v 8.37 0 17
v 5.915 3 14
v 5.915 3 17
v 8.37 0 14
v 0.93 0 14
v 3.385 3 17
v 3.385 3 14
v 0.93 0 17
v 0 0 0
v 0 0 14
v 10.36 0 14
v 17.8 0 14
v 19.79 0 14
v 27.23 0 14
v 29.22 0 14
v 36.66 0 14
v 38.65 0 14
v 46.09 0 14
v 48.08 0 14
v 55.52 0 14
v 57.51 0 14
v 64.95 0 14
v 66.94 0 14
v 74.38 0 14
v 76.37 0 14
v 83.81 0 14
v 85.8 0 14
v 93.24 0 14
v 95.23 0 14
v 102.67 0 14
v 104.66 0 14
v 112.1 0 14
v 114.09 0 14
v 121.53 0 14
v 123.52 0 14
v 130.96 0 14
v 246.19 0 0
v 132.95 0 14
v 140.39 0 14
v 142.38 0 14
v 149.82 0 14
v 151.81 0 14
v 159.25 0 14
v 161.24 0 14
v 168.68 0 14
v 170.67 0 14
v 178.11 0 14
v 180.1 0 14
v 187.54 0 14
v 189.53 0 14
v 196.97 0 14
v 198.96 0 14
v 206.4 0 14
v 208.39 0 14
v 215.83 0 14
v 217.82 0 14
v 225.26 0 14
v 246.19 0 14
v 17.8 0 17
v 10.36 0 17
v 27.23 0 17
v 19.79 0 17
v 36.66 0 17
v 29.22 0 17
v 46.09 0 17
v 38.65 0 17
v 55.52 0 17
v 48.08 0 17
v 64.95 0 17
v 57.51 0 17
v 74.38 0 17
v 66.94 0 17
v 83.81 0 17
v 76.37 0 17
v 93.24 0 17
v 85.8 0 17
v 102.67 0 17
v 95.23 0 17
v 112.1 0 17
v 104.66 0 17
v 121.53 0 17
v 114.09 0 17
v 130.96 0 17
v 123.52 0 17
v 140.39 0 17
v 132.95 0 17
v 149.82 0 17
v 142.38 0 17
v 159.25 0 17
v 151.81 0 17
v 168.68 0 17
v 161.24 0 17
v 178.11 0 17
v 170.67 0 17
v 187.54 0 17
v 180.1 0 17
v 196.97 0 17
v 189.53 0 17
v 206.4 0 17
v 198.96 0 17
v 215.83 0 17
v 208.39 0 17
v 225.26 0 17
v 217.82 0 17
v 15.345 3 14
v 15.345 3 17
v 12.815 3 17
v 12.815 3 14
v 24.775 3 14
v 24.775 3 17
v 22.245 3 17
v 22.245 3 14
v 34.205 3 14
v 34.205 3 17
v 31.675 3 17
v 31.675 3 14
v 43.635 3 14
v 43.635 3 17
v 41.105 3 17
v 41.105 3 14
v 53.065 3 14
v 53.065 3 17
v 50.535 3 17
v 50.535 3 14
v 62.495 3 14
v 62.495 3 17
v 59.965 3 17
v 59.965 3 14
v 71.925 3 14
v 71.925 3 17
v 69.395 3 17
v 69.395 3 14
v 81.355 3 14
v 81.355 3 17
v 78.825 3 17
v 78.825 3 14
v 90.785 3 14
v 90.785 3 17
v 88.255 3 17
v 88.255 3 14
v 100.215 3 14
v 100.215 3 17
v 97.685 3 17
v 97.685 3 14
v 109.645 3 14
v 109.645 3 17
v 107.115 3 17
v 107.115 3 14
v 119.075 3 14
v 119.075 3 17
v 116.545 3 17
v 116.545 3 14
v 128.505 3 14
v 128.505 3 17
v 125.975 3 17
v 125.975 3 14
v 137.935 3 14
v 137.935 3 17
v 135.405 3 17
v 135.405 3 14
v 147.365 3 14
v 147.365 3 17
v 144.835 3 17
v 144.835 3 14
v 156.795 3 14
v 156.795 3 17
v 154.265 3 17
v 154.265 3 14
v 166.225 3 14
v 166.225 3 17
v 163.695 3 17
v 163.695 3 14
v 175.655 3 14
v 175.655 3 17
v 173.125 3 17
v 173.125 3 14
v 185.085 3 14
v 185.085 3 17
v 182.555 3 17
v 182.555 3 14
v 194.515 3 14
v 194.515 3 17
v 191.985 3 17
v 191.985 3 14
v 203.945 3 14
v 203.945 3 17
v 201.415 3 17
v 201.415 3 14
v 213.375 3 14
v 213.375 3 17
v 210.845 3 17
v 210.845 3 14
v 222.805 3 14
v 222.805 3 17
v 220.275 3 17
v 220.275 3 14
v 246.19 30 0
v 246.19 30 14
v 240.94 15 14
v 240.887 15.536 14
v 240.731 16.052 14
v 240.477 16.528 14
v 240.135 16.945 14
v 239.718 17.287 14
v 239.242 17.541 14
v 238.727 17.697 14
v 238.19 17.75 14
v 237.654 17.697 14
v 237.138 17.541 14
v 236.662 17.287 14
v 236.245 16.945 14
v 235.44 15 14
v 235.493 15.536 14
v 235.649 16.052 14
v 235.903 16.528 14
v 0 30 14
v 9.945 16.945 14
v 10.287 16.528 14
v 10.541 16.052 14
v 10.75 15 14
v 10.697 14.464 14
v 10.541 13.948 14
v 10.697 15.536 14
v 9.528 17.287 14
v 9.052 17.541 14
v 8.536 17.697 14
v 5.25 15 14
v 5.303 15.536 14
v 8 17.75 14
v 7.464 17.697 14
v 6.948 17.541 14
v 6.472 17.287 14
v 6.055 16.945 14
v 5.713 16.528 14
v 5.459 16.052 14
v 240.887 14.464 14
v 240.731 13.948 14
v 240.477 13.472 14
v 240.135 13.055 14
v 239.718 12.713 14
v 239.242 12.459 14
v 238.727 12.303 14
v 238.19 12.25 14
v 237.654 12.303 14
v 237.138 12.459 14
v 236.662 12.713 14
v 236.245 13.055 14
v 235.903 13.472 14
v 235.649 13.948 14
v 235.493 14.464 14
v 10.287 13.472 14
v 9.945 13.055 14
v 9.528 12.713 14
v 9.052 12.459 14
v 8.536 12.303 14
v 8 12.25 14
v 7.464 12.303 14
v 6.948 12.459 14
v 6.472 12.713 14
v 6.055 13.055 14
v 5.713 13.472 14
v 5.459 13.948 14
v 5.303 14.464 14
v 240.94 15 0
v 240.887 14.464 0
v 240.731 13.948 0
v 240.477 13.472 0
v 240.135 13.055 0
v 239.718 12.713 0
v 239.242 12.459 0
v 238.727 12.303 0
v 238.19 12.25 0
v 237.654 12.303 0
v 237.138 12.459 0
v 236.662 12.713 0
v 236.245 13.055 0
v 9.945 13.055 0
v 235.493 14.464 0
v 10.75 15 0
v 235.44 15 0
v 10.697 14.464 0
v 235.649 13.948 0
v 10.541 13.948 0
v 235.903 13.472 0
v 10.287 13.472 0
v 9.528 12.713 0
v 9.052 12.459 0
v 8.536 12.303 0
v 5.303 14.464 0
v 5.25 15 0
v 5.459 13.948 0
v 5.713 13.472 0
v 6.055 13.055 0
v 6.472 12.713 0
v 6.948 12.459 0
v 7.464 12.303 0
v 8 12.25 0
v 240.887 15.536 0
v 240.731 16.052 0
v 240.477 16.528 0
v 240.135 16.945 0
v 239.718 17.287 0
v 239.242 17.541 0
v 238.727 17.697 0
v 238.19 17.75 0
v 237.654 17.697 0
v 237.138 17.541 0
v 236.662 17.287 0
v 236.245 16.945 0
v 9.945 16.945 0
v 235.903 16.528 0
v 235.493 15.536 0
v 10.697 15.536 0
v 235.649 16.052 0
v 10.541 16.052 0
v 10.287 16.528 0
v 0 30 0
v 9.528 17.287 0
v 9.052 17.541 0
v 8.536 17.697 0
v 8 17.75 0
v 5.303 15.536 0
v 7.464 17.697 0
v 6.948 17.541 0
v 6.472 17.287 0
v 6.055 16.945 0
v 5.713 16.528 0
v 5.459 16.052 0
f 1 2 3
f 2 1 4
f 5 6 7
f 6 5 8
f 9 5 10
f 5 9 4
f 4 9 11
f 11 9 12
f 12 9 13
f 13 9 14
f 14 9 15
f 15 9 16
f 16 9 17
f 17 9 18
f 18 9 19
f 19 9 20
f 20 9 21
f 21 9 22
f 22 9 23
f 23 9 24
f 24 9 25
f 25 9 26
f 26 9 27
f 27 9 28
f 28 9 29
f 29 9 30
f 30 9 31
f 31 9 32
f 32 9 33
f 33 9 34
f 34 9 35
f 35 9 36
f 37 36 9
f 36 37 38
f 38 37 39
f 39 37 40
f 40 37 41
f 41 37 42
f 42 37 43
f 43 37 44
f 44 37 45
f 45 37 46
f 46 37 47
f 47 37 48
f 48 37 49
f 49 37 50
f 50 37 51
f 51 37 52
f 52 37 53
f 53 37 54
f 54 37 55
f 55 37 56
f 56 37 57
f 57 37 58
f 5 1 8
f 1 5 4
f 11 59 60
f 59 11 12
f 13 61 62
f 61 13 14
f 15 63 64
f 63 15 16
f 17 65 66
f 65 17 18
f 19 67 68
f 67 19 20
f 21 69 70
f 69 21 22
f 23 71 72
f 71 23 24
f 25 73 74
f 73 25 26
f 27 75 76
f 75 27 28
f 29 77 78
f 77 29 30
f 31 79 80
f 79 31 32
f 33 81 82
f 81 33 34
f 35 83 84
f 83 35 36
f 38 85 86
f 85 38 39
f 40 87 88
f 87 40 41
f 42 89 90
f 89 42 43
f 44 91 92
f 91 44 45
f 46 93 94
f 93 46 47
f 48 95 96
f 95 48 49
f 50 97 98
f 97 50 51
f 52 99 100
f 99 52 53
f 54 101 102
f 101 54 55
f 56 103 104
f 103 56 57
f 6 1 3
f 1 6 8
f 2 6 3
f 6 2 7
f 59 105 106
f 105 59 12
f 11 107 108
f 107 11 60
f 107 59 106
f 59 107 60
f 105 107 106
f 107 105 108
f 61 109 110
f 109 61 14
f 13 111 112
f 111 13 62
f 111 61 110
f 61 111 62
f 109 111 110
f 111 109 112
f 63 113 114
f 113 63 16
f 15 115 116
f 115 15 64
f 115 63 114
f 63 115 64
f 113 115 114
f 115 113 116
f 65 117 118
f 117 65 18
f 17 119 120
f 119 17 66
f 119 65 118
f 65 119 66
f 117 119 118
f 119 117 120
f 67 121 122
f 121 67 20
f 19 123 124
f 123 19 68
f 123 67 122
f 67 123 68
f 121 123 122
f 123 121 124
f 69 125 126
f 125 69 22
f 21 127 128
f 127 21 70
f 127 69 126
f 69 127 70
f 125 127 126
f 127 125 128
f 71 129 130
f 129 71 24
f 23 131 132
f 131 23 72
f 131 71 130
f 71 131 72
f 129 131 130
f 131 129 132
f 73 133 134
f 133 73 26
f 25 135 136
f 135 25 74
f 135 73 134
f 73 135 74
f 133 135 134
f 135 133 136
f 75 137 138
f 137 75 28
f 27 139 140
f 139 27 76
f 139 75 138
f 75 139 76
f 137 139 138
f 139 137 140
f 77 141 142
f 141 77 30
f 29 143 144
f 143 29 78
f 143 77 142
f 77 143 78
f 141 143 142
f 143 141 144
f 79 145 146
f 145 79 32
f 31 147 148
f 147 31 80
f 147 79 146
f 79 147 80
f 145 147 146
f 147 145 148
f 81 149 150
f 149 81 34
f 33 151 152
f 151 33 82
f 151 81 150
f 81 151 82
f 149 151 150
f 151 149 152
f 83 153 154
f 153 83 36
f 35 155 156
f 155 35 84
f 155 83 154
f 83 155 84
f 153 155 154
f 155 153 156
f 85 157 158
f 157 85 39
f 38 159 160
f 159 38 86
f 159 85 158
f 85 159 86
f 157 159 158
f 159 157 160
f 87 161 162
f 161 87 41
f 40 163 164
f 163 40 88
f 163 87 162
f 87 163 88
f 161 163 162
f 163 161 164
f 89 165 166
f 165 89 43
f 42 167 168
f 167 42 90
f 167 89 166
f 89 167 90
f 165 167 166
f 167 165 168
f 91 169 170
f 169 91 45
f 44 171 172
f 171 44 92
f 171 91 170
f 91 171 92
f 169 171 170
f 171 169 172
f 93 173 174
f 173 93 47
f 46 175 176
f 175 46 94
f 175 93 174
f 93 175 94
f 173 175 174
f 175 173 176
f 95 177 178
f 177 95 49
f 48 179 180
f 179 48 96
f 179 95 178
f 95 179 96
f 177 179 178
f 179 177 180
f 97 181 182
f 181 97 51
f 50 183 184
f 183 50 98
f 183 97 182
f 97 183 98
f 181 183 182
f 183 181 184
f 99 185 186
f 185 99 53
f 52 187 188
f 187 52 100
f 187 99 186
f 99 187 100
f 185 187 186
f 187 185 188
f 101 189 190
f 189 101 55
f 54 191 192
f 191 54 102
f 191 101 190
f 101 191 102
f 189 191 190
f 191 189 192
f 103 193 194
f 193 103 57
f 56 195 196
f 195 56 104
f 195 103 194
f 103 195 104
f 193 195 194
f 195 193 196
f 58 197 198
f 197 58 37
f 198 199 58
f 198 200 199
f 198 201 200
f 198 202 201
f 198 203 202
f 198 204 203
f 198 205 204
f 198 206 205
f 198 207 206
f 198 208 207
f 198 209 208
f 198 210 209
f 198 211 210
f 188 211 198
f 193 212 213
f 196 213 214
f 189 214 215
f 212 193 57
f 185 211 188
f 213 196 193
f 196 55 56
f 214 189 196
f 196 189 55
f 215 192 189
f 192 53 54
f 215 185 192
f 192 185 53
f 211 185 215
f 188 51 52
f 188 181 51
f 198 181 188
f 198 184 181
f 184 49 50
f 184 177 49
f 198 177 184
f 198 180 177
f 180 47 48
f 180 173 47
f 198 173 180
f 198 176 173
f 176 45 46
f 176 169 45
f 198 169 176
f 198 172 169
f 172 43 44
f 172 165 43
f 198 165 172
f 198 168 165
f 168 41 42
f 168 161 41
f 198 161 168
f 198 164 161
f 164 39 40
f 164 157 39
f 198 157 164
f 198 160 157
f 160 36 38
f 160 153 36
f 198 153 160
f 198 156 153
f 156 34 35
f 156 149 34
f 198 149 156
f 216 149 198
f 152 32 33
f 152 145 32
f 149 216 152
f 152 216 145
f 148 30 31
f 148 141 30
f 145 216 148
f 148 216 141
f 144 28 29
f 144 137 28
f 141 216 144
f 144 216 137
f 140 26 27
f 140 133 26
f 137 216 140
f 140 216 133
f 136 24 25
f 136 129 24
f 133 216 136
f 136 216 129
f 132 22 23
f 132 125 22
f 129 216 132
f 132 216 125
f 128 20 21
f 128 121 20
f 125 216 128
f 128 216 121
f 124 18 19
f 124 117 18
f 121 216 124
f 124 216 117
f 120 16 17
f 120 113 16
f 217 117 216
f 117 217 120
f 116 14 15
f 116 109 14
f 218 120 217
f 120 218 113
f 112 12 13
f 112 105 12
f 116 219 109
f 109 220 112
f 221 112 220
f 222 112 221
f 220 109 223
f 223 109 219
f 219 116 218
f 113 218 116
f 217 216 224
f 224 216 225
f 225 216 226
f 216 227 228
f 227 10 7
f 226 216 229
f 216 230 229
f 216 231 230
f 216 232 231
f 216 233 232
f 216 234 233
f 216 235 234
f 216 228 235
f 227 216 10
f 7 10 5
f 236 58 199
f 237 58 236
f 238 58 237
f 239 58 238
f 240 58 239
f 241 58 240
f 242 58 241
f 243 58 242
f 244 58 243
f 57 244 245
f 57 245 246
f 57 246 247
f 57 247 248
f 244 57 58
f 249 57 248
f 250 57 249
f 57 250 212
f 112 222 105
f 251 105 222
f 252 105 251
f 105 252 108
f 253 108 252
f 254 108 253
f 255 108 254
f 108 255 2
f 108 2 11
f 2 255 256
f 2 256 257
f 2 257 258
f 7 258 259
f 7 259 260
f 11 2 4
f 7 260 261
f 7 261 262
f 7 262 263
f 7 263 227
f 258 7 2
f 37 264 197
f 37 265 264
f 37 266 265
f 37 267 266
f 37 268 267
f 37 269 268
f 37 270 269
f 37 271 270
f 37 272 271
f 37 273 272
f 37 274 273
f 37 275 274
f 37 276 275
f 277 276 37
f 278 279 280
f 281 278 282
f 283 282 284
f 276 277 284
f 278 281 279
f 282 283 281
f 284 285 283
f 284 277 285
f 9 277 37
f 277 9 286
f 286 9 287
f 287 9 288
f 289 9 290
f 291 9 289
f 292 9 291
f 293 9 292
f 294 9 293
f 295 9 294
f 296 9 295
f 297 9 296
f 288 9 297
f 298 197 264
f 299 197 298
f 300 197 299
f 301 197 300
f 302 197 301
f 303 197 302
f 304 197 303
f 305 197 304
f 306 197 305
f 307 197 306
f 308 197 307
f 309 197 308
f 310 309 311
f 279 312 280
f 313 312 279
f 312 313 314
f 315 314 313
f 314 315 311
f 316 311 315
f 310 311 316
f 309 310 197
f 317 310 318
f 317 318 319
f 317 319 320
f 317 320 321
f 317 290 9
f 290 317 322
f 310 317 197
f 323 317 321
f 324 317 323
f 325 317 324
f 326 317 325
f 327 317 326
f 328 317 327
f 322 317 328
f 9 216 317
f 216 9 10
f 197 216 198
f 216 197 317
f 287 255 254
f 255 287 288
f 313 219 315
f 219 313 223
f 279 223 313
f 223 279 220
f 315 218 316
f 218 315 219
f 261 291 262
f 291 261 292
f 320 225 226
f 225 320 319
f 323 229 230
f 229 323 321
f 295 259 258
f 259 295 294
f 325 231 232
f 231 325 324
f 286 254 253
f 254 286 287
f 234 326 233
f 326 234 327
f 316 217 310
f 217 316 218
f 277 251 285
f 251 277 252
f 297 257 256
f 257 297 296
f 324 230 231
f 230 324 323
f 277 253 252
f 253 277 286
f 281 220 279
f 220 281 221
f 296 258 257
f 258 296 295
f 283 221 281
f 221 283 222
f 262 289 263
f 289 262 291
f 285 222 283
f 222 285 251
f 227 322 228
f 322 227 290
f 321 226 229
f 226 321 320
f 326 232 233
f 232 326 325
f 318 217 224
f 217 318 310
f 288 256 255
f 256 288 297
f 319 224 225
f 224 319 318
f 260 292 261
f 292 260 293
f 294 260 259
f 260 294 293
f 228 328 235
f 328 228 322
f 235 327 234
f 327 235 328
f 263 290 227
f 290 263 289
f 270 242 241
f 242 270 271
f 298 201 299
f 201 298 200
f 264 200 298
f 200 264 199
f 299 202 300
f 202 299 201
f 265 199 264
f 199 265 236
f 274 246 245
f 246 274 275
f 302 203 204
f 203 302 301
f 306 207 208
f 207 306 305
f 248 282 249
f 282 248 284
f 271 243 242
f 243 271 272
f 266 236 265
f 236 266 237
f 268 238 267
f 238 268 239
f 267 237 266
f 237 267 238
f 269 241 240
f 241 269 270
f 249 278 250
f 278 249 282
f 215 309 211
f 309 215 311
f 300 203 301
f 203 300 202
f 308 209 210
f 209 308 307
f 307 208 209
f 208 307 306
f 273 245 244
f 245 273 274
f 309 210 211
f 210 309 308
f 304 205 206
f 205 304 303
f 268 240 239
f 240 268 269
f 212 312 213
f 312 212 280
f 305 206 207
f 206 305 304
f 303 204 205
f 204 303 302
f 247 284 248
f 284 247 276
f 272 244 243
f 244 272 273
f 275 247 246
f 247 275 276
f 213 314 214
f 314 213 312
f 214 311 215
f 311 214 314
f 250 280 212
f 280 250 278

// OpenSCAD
$fn = 32;

// ----------------------------------------------------------------------
// Gear rack: m=3 z=24, 246.19 x 30 x 17 mm
// ----------------------------------------------------------------------

// --- parameters (mm) ---
length = 246.19;          // rack length, X
width = 30;               // rack width, Y
height = 17;              // overall height, Z
module_m = 3;             // module
back_t = 14;              // tooth root line height
pitch = 9.43;             // circular pitch
tip_w = 2.53;             // tooth thickness at the tip
root_w = 7.44;            // tooth thickness at the root line
hole_d = 5.5;             // mounting hole
sink = 0.6;               // tooth root overlap into the body

tooth_span = 226.19;

module tooth(x0) {
  /* 20 deg flank profile, sunk into the body for a positive overlap */
  translate([x0, 0, back_t - sink])
    linear_extrude(height = height - back_t + sink)
      polygon(points = [[-root_w / 2, 0], [root_w / 2, 0],
                        [tip_w / 2, height - back_t],
                        [-tip_w / 2, height - back_t]]);
}

difference() {
  union() {
    cube([length, width, back_t]);
    for (i = [0 : 24 - 1])
      tooth((i + 0.5) * pitch + (tooth_span - 24 * pitch) / 2);
  }
  translate([8, 15, -1]) cylinder(h = back_t + 2, d = hole_d);
  translate([238.19, 15, -1]) cylinder(h = back_t + 2, d = hole_d);
}
